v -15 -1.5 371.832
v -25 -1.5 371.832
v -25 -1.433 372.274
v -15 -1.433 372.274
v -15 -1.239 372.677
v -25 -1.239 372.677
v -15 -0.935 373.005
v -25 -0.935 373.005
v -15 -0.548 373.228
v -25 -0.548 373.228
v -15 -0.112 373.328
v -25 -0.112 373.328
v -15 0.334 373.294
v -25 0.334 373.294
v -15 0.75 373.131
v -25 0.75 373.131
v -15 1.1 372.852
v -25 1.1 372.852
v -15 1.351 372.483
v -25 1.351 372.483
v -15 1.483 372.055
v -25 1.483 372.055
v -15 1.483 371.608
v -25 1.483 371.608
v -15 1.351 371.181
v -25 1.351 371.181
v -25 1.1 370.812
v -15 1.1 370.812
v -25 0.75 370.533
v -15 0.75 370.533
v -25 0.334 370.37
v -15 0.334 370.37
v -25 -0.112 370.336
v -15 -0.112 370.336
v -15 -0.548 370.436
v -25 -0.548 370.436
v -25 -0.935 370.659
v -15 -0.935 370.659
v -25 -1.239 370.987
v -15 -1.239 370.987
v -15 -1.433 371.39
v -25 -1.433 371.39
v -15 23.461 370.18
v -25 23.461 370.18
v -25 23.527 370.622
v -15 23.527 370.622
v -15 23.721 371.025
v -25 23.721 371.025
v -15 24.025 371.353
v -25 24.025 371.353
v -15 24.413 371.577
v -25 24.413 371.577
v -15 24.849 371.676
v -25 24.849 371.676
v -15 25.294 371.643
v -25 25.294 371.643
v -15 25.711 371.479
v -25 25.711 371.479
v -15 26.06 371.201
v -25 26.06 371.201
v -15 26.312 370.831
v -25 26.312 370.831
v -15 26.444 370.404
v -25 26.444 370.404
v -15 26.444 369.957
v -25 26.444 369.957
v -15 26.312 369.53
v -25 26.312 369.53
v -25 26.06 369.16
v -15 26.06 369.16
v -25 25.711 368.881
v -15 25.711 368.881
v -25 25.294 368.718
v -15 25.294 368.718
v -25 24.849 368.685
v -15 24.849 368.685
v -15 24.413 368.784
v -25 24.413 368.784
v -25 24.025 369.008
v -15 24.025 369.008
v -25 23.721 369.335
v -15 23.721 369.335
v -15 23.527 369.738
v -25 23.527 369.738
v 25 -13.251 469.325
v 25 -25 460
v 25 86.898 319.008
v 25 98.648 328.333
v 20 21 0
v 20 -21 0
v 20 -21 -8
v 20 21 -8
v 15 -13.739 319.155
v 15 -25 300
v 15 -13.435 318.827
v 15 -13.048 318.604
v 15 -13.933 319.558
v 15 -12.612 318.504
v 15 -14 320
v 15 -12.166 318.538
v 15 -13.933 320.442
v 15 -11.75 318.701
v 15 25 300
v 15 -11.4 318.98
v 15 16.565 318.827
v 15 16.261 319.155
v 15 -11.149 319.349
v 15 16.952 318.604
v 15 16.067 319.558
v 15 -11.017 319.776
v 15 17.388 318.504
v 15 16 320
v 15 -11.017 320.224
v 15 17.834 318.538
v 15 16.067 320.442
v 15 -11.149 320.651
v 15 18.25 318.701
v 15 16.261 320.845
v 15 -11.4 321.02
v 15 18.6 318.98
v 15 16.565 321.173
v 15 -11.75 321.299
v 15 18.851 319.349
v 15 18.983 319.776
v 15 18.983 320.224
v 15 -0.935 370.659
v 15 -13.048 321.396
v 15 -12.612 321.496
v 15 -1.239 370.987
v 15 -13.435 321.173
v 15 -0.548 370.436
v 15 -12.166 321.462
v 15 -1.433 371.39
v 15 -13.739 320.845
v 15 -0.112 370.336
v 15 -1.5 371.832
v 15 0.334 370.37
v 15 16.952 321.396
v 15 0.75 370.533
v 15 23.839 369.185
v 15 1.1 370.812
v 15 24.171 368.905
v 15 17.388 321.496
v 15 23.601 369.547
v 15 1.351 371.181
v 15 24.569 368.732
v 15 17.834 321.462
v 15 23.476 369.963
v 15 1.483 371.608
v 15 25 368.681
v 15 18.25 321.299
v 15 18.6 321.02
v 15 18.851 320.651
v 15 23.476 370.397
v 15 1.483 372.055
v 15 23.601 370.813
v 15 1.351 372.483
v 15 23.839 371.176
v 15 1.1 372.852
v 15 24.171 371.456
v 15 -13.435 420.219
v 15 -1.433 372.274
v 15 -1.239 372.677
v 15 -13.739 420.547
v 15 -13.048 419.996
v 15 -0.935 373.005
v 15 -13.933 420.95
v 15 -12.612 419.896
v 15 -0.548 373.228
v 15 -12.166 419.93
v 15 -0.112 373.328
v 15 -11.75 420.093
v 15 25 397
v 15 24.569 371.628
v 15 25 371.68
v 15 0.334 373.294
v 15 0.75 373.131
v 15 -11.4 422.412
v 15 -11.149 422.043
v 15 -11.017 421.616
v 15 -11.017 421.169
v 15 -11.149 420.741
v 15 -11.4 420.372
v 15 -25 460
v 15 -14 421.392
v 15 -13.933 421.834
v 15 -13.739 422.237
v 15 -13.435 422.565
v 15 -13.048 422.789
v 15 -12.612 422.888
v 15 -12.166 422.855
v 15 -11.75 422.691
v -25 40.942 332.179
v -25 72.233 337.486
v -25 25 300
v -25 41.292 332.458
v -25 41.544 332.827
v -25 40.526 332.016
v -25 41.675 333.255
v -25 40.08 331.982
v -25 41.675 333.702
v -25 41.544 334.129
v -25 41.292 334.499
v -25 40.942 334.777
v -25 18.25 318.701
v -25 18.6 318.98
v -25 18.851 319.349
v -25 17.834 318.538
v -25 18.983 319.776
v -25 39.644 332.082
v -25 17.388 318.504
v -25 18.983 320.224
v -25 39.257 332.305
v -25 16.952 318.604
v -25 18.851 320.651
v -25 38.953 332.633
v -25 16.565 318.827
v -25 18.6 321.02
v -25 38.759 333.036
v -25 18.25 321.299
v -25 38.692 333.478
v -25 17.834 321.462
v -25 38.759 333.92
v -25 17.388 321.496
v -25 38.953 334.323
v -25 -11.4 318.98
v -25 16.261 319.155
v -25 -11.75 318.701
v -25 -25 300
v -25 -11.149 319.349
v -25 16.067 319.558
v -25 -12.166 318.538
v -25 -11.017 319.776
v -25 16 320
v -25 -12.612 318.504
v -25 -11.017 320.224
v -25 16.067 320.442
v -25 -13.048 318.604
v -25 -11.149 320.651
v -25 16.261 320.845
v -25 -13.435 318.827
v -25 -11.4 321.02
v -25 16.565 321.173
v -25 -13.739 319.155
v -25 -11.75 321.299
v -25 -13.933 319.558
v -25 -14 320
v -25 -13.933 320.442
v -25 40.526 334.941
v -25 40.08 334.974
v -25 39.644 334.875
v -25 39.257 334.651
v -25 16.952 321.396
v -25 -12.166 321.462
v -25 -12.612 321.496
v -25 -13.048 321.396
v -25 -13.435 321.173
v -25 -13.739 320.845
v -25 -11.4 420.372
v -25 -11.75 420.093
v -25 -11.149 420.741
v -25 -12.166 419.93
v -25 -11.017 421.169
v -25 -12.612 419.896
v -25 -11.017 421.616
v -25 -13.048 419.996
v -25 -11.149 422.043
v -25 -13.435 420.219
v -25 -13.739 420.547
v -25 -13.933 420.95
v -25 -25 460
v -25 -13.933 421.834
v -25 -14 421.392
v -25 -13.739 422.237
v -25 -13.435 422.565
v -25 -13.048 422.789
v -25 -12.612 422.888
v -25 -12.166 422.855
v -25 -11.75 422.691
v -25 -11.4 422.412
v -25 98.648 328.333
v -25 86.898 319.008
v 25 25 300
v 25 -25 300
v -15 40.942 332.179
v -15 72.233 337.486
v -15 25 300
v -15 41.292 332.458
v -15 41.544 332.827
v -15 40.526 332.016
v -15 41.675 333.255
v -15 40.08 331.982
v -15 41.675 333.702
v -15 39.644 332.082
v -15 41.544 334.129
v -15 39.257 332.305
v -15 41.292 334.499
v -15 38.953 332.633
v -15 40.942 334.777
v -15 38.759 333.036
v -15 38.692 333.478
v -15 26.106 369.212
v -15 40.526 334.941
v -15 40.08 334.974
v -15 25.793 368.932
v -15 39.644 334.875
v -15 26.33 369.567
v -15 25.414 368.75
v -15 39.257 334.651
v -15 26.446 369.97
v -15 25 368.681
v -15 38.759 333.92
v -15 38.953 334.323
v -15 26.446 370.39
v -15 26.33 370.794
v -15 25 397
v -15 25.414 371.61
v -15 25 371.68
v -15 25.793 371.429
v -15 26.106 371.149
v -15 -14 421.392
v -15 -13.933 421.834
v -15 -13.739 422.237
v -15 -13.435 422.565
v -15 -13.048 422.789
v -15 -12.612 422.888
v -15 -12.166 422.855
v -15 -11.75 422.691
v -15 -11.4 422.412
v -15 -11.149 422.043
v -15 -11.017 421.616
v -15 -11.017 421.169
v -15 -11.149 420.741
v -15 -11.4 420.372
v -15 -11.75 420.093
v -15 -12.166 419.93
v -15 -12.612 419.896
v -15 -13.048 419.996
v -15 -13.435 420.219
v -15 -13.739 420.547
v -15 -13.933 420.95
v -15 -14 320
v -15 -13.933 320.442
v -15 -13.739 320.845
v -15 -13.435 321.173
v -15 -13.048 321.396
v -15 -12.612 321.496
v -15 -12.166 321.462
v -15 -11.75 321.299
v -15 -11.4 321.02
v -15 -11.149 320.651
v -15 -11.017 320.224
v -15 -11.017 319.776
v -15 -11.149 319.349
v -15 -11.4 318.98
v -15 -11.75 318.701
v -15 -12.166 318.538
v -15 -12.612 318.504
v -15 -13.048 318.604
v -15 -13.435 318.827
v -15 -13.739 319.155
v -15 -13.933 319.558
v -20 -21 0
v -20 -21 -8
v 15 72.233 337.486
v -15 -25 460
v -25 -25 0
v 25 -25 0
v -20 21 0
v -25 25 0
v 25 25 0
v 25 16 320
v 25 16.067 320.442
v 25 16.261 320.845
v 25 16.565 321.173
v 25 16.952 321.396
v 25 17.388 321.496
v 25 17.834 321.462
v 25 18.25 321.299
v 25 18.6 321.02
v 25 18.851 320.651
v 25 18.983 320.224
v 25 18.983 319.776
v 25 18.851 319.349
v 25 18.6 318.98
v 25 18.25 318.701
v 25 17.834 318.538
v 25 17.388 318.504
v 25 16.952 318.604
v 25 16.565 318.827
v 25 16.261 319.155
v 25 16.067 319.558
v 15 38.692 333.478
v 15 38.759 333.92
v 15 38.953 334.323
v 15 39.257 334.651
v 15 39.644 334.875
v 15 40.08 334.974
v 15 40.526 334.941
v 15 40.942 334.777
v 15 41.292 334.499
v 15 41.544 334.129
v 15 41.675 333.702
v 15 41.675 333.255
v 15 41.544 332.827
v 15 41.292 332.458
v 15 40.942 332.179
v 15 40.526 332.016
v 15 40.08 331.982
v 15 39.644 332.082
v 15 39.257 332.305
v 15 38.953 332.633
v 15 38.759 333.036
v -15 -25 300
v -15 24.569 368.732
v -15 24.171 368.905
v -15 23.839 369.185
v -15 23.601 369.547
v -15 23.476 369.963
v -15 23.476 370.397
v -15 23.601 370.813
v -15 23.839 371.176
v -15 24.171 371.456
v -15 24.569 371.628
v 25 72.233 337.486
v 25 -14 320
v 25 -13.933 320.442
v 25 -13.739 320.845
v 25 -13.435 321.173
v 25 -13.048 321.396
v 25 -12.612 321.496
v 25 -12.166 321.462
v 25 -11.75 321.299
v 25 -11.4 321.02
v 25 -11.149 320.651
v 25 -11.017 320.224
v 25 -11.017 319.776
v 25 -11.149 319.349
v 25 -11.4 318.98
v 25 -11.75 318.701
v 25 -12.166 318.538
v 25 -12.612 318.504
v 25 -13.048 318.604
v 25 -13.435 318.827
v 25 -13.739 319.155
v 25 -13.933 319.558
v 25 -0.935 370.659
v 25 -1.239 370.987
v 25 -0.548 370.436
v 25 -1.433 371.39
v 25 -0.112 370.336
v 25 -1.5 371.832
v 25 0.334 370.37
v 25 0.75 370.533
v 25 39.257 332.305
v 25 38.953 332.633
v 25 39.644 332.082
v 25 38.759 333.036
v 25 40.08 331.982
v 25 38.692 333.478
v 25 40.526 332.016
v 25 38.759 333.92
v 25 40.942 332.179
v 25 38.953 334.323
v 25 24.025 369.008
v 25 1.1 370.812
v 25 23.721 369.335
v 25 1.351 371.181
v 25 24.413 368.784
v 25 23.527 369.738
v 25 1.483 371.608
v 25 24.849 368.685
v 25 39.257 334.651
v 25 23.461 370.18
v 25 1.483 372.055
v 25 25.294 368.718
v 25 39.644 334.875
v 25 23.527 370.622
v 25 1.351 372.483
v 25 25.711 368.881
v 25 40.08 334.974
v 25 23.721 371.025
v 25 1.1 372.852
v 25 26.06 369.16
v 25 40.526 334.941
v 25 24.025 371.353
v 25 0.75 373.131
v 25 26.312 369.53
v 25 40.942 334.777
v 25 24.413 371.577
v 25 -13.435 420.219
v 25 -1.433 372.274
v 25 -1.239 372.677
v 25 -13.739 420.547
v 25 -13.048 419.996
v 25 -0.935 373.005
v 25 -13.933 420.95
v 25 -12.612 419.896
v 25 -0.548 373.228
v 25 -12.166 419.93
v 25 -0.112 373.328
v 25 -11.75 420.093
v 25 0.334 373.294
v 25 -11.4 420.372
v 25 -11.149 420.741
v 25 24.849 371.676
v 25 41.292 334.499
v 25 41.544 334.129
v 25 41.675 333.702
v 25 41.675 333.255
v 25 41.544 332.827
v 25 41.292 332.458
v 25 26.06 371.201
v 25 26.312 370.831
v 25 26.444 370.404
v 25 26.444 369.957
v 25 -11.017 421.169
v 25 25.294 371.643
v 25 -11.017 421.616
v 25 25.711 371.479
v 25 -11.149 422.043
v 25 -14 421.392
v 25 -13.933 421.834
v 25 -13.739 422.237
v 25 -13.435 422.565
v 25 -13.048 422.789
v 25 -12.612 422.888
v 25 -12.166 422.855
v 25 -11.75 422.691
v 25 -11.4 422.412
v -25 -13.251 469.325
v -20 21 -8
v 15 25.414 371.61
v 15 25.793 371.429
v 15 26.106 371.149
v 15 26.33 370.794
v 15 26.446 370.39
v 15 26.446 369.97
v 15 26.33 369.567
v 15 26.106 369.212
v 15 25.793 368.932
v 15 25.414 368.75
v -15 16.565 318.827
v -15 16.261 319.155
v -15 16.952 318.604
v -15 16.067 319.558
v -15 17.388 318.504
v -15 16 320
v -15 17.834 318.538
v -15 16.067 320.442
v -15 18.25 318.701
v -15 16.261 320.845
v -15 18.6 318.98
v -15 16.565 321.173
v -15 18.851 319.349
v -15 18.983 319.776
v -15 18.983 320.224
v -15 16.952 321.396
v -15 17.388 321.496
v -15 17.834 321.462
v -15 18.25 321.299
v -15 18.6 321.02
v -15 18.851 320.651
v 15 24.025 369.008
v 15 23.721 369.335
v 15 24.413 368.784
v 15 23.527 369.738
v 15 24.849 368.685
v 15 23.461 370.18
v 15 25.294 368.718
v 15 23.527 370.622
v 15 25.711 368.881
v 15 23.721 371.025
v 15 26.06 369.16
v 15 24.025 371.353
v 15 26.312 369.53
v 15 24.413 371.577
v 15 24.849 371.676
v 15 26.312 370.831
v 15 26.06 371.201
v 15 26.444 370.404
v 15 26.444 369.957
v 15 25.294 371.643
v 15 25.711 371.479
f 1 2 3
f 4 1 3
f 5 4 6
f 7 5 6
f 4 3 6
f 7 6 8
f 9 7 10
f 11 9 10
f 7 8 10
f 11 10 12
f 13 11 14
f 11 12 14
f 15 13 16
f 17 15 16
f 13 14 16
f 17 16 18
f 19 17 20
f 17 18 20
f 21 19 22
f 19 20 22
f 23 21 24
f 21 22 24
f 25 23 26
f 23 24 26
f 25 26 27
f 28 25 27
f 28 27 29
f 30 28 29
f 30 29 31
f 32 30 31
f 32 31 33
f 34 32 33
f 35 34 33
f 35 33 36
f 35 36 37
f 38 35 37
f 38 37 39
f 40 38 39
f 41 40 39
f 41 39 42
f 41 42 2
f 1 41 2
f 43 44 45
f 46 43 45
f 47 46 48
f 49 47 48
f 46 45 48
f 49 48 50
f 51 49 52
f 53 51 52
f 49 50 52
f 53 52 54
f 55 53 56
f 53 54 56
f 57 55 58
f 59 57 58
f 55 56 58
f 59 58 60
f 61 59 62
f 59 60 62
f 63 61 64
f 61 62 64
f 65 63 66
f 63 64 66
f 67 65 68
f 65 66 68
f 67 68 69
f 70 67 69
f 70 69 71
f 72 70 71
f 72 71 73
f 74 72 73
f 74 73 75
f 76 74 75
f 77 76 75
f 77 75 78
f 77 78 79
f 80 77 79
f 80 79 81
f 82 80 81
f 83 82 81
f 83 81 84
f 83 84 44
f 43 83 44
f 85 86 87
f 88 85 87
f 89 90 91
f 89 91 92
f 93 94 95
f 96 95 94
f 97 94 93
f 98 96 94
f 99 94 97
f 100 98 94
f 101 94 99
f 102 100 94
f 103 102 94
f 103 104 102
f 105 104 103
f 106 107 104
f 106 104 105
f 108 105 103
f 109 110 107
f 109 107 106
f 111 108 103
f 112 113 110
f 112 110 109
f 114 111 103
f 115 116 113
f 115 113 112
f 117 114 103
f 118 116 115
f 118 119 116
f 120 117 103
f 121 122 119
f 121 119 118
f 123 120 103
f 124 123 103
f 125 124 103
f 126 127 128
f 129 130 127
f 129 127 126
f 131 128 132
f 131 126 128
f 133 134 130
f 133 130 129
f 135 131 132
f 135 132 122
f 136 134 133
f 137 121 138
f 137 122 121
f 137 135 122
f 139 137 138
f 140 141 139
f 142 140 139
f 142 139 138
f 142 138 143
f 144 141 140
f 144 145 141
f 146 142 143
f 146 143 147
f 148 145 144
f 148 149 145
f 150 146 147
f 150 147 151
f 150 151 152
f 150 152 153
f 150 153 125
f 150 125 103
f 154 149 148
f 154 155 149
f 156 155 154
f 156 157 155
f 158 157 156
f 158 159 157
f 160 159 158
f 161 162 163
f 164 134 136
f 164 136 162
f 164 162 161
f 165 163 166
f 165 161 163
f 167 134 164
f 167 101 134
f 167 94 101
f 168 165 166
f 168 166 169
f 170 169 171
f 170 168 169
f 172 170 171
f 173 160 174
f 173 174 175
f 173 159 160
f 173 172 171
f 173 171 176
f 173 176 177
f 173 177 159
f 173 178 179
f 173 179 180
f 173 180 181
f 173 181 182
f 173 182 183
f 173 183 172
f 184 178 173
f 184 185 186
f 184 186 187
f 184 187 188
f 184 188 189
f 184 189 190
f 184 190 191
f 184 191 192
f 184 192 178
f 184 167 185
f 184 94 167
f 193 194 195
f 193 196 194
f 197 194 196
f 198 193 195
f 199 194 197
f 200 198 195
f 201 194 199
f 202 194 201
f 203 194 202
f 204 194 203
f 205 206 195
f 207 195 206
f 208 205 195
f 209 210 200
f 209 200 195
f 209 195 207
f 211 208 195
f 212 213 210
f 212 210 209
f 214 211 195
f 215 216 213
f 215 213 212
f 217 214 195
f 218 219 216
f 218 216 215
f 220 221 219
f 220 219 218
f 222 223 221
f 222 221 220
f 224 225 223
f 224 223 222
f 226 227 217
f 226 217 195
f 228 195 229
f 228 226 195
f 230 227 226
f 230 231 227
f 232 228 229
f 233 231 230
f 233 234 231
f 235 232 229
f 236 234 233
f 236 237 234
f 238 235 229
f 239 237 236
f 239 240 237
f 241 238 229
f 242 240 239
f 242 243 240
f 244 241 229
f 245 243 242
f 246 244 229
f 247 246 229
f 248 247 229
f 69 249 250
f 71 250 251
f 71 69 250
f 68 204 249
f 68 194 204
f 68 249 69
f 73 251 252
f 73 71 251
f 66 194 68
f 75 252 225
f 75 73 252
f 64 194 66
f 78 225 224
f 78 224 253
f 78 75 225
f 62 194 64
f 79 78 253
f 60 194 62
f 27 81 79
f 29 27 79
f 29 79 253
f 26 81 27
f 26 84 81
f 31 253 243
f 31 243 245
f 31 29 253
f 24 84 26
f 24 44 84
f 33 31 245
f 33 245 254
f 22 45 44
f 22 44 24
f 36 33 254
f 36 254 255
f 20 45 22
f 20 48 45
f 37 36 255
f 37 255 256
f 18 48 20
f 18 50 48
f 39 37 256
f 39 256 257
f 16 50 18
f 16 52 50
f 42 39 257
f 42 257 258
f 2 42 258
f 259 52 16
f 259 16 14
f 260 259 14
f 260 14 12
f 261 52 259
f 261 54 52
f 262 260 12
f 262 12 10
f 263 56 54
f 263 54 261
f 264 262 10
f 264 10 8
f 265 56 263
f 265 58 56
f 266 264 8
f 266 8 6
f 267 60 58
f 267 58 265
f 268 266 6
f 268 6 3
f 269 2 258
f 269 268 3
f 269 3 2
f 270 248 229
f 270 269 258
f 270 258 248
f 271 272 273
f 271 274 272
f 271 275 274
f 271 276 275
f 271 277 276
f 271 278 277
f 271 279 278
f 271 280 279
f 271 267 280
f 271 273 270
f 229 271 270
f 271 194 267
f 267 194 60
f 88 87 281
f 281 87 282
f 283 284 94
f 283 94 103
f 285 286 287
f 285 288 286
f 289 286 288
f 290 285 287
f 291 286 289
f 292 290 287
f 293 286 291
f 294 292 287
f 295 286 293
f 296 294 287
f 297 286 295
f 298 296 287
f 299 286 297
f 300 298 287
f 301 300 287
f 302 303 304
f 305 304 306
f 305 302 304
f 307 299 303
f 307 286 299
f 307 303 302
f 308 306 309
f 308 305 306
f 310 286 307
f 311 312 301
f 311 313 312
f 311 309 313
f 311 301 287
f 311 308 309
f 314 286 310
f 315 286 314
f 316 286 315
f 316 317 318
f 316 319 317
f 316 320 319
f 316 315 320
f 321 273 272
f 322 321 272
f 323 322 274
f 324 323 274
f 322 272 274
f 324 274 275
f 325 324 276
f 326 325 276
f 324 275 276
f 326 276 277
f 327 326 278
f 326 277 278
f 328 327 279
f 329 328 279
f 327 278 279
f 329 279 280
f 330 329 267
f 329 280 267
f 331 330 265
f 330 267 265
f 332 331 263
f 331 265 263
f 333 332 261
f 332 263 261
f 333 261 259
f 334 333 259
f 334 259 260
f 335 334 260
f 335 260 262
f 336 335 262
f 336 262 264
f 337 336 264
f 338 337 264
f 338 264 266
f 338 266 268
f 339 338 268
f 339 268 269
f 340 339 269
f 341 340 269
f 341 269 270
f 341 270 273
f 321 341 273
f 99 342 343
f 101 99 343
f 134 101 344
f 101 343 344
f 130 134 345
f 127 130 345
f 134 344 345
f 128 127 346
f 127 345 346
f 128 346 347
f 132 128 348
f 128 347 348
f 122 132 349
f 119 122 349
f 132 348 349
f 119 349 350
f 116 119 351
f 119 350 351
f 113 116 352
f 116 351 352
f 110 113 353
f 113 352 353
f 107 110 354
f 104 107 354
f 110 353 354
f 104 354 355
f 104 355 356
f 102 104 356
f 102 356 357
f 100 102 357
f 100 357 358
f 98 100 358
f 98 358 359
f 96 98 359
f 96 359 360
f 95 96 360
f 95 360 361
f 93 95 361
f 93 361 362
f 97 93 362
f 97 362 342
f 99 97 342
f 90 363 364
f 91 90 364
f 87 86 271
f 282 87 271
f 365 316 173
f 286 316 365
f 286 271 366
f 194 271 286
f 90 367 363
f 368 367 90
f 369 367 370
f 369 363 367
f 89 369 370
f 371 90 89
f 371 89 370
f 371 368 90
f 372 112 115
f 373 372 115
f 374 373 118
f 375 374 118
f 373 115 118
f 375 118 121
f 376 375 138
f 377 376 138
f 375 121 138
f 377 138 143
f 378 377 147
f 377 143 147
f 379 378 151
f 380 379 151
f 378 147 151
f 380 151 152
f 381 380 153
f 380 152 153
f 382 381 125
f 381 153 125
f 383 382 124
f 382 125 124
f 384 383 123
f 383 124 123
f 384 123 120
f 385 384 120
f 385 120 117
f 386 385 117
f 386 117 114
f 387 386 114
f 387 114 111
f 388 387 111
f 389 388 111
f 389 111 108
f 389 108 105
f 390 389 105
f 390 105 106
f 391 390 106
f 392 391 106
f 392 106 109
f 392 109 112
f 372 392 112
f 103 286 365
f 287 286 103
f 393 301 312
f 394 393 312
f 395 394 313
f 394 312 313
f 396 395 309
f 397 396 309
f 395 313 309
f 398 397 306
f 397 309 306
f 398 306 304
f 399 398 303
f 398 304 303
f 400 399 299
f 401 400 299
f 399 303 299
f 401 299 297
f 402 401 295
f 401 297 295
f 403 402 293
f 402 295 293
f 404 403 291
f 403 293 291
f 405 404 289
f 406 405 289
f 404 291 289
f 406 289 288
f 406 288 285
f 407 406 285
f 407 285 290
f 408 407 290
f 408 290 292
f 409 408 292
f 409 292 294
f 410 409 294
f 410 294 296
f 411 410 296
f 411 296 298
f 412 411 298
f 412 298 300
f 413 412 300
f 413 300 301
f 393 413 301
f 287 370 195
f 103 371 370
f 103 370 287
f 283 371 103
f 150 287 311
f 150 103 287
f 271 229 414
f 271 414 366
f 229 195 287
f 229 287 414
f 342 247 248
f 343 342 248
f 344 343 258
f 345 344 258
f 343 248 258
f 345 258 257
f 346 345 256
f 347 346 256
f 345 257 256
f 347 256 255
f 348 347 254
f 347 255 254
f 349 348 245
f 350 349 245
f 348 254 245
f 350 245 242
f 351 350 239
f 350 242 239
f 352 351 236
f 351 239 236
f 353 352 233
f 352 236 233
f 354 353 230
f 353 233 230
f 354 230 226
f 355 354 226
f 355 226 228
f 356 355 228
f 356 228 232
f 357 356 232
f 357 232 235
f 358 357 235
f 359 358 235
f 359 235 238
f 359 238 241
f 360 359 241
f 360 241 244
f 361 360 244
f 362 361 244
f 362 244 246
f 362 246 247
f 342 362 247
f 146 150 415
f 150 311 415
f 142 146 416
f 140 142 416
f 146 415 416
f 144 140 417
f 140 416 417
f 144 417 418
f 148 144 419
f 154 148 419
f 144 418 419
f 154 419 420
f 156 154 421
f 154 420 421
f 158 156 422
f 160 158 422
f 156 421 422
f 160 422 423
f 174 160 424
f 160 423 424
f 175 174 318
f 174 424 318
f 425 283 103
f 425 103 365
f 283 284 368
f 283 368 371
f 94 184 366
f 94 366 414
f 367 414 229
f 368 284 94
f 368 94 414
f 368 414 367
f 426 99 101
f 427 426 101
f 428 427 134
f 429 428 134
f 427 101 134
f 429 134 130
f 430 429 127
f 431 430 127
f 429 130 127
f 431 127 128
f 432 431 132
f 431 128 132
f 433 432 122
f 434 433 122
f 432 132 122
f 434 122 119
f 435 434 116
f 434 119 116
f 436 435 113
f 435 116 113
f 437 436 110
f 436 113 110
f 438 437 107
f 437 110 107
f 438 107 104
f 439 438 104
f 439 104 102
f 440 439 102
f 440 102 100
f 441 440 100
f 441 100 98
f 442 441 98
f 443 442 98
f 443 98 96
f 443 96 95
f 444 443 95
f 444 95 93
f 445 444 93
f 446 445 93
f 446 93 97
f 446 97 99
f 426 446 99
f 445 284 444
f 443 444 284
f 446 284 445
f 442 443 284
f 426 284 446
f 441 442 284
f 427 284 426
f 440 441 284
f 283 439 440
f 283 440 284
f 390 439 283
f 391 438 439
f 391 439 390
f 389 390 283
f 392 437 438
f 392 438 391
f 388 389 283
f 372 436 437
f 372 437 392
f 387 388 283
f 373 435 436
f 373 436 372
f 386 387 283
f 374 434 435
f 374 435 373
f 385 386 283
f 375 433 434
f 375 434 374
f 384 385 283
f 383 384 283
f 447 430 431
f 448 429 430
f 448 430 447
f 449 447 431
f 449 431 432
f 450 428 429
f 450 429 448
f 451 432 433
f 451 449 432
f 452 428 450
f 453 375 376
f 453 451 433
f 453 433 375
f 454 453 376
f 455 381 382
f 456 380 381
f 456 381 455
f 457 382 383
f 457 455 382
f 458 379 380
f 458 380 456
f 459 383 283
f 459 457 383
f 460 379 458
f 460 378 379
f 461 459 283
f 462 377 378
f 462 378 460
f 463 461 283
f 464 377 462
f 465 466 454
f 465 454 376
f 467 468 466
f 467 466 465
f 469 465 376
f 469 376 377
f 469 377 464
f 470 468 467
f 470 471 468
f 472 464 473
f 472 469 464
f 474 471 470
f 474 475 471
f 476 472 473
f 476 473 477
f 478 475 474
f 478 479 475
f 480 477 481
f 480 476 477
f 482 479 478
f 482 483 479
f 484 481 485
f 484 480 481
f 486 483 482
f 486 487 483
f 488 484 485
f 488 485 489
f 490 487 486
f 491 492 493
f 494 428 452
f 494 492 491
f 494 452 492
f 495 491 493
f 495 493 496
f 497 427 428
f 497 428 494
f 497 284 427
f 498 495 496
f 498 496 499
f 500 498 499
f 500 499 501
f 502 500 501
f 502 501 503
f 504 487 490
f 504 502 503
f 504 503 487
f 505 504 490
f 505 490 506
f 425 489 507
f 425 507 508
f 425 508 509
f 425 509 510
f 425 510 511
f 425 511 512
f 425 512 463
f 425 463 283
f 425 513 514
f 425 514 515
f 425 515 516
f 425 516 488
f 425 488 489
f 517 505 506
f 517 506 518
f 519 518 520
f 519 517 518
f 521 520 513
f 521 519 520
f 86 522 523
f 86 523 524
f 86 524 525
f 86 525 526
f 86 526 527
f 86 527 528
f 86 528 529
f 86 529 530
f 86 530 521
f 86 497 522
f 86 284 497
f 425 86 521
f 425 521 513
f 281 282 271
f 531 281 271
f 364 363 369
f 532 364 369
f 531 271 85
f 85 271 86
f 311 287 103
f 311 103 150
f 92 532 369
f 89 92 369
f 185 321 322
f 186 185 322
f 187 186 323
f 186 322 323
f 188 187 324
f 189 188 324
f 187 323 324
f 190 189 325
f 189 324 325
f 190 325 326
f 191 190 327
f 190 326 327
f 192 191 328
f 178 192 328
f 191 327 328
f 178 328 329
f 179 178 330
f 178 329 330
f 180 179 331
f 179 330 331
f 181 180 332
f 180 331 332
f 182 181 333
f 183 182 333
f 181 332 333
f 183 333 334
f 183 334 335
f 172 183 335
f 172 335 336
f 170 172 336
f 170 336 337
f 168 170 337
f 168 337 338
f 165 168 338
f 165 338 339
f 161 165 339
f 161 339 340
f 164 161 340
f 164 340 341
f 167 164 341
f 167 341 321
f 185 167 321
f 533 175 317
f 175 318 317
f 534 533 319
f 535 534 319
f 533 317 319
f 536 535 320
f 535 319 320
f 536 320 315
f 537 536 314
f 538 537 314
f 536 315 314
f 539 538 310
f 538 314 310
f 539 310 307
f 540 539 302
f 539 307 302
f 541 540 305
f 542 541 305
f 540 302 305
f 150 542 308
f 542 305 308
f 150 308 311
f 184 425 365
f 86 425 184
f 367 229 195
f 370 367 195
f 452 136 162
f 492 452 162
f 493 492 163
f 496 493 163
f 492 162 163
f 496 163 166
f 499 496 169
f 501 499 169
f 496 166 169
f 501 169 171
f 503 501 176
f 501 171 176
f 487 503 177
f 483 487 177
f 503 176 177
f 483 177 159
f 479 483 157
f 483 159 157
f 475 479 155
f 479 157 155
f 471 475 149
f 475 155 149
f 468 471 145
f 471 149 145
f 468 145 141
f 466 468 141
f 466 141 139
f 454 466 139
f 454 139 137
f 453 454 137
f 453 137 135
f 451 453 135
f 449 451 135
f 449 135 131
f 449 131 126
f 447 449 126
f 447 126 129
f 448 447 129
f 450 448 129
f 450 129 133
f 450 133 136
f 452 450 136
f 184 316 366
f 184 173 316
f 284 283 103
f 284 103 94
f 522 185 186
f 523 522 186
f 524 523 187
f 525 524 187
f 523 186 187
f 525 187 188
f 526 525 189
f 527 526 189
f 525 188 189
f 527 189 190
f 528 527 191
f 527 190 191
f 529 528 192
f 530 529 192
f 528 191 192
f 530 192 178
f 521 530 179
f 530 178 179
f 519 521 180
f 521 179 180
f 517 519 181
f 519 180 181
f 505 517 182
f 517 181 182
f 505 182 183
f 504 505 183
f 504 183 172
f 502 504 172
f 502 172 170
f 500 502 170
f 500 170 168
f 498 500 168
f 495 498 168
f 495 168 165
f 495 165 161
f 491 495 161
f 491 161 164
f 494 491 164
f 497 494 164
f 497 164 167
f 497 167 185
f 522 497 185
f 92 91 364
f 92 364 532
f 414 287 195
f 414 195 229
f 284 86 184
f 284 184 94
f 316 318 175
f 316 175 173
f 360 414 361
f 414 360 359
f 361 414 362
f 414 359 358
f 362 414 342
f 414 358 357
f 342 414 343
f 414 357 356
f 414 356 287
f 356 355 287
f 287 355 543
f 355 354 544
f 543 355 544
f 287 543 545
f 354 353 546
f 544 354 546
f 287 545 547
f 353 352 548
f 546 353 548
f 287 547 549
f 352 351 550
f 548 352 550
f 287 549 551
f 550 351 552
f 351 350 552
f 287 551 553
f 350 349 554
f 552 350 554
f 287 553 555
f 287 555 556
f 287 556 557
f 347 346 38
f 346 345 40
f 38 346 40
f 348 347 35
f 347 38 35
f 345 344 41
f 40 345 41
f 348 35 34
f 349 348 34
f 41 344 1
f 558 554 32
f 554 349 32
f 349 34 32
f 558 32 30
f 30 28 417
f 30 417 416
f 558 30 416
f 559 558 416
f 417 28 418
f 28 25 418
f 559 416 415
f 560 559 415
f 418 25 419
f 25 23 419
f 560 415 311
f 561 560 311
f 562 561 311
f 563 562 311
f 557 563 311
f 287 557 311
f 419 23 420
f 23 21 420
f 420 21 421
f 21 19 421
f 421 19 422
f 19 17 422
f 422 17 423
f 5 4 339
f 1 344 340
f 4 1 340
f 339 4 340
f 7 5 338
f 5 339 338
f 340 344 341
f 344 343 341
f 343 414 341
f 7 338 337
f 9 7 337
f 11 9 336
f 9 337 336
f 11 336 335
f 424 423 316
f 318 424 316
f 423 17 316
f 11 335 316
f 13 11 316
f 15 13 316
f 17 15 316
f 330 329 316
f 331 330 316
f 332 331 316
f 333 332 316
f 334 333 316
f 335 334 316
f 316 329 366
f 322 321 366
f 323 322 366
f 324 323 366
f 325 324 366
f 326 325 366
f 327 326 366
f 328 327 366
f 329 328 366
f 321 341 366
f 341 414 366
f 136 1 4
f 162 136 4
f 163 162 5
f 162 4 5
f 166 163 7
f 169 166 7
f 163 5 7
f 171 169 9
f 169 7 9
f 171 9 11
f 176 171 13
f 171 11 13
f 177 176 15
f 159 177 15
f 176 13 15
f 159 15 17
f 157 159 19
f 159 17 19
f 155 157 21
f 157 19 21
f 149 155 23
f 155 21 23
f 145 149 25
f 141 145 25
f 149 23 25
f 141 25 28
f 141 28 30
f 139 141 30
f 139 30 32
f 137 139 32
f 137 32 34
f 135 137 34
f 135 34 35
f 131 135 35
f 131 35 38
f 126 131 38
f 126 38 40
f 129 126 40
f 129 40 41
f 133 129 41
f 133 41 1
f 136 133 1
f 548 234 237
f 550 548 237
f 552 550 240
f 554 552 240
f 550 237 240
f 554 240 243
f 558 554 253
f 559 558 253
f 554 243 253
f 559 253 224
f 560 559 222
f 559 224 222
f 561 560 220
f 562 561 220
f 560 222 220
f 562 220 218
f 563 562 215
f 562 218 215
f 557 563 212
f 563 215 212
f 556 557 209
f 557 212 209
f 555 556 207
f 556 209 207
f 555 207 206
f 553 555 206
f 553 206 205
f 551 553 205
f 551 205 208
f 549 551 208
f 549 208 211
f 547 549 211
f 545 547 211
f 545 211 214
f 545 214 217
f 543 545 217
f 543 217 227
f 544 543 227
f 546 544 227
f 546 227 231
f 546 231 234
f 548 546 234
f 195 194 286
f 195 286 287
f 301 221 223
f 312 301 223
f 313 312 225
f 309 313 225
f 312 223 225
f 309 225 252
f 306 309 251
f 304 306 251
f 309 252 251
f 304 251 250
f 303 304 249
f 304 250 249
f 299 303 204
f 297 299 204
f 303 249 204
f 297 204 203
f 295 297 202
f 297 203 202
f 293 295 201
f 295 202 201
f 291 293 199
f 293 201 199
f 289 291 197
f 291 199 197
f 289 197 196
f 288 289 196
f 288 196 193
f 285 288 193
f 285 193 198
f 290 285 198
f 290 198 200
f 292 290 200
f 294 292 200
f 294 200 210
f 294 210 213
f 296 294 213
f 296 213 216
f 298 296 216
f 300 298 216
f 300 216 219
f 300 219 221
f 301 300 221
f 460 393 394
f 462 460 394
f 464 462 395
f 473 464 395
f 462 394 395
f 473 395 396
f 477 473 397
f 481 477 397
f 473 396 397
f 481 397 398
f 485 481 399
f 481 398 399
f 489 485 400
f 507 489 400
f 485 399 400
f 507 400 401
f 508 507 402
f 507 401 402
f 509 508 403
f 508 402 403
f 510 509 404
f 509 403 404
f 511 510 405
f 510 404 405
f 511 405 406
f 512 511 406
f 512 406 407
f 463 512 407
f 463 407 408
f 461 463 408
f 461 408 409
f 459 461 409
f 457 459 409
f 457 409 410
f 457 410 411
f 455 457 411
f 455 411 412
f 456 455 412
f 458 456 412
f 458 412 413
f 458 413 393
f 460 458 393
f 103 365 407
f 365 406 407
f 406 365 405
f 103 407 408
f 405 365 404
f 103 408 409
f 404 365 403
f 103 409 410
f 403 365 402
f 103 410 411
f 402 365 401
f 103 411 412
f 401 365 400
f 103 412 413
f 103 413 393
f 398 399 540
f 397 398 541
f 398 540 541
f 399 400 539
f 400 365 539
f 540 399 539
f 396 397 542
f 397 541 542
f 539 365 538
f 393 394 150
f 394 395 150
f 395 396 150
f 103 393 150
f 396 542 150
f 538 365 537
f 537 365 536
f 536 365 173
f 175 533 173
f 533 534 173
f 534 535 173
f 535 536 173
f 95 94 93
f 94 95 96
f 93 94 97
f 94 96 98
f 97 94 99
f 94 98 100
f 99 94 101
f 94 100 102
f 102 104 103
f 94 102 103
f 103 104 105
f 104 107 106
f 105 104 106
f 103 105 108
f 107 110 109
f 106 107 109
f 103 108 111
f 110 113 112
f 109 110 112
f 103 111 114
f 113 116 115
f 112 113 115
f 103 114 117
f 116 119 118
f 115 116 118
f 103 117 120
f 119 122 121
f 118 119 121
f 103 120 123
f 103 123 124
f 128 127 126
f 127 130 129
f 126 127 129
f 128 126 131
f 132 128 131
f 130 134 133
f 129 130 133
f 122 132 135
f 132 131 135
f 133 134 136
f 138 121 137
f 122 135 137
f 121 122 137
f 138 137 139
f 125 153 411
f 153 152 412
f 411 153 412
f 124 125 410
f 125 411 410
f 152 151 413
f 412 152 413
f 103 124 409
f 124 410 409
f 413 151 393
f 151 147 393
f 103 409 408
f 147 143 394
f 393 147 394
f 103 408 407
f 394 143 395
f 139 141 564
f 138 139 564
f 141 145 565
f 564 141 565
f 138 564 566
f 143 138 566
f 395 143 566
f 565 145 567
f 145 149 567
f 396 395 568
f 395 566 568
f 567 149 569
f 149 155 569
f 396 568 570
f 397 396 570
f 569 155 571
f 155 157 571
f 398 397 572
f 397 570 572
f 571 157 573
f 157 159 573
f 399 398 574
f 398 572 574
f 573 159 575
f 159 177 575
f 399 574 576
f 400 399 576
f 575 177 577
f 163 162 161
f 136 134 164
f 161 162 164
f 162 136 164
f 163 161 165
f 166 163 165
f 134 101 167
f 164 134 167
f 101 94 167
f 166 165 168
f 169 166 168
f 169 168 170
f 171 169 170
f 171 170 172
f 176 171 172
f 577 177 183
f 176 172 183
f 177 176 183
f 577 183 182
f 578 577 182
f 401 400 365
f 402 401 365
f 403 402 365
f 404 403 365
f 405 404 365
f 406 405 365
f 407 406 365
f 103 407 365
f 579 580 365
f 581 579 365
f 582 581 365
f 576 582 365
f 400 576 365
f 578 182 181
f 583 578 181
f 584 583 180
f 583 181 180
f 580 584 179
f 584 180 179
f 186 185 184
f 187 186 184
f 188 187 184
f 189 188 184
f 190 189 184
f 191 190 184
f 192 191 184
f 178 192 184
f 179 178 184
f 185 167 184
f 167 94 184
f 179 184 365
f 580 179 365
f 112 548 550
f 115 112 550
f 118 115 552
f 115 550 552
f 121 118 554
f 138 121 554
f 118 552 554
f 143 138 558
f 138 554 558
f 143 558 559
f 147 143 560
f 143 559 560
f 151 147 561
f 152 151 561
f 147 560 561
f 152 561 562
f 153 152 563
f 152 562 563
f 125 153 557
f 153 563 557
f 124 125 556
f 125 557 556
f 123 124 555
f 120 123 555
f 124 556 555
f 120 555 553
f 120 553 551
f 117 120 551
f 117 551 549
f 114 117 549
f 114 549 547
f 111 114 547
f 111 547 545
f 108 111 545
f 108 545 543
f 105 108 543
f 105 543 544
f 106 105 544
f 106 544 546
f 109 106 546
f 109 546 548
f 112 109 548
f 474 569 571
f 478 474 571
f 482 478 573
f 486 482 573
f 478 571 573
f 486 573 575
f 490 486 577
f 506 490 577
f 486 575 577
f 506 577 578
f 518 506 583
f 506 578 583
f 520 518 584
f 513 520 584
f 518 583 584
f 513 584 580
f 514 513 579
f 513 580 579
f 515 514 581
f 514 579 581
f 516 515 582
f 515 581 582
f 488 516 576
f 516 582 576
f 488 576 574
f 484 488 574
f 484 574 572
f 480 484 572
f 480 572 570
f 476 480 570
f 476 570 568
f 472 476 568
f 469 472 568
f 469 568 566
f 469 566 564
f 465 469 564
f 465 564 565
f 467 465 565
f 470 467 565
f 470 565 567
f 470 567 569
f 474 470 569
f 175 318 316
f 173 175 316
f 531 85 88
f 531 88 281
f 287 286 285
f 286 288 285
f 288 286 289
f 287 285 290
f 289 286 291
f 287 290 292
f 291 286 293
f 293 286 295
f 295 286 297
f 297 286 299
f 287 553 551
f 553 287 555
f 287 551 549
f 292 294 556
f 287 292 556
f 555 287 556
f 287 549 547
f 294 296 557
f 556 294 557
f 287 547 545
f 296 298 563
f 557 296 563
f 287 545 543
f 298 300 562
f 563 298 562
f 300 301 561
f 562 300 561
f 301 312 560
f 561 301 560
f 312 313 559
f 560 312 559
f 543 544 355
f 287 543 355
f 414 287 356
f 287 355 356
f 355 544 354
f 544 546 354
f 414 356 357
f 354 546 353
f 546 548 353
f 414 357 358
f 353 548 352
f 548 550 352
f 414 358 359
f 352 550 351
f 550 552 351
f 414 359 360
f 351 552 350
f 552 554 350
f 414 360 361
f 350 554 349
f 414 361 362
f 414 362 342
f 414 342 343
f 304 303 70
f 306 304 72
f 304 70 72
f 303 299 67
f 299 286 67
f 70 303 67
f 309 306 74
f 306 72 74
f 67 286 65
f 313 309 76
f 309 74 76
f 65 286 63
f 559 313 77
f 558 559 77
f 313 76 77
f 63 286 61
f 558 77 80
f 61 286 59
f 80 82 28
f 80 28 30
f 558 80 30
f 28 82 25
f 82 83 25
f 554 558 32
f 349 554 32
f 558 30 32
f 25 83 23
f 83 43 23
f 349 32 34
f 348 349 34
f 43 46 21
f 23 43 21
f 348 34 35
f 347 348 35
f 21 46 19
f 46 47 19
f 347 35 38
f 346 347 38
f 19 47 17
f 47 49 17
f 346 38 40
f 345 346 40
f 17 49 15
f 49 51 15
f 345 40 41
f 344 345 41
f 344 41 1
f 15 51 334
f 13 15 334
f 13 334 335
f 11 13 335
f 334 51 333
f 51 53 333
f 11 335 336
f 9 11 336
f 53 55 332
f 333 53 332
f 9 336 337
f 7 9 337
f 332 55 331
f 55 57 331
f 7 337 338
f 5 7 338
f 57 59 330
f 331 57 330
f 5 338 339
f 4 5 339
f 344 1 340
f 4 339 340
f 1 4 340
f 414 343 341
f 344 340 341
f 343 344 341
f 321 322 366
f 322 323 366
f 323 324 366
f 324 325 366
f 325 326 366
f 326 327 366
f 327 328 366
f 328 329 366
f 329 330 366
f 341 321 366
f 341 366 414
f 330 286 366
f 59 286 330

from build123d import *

# Parameters (mm, degrees)
F1_DEPTH  = 20
F2_DEPTH  = 25
F3_DEPTH  = 15
F5_DEPTH  = 30
F7_DEPTH  = 10
F9_DEPTH  = 10
F10_R     = 1.5
F11_DEPTH = 50.001
F12_W     = 30
F12_H     = 80.4300938704
F12_H_2   = 75.9790235959
F13_DEPTH = 15


with BuildPart() as f1:
    # F0 (on Right) → F1 (new body, symmetric)
    with BuildSketch(Plane.YZ):
        Polygon((21, 0), (0, 0), (-21, 0), (-21, -8), (0, -8), (21, -8), align=None)
    extrude(amount=F1_DEPTH, both=True)

    # F0 (on Right) → F2 (join, symmetric)
    with BuildSketch(Plane.YZ):
        Polygon((-21, 0), (0, 0), (21, 0), (25, 0), (25, 300), (-25, 300), (-25, 0), align=None)
    extrude(amount=F2_DEPTH, both=True)

    # F0 (on Right) → F3 (join, symmetric)
    with BuildSketch(Plane.YZ):
        Polygon((-25, 460), (-25, 300), (25, 300), (25, 397), align=None)
    extrude(amount=F3_DEPTH, both=True)


with BuildPart() as f5:
    # F4 (on face) → F5 (new body)
    with BuildSketch(Plane(origin=(-15, 0, 0), x_dir=(0, -1, 0), z_dir=(-1, 0, 0))):
        Polygon((-25, 300), (-25, 397), (-72.2329571804, 337.4864739527), align=None)
    extrude(amount=-F5_DEPTH)


with BuildPart() as f7:
    # F6 (on face) → F7 (new body)
    with BuildSketch(Plane(origin=(-25, 0, 0), x_dir=(0, -1, 0), z_dir=(-1, 0, 0))):
        Polygon((-25, 300), (25, 300), (25, 460), (-25, 397), (-72.2329571804, 337.4864739527), align=None)
    extrude(amount=-F7_DEPTH)


with BuildPart() as f9:
    # F8 (on face) → F9 (new body)
    with BuildSketch(Plane.YZ.offset(25)):
        Polygon((25, 397), (-25, 460), (-25, 300), (25, 300), (72.2329571804, 337.4864739527), align=None)
    extrude(amount=-F9_DEPTH)


with BuildPart() as f11_tool:
    # F10 (on face) → F11 (new body, through all)
    with BuildSketch(Plane(origin=(-25, 0, 0), x_dir=(0, -1, 0), z_dir=(-1, 0, 0))):
        with Locations((-40.192078799, 333.4782421589)):
            Circle(F10_R)
        with Locations((-17.5, 320)):
            Circle(F10_R)
        with Locations((12.5, 320)):
            Circle(F10_R)
        with Locations((0, 371.8319237232)):
            Circle(F10_R)
        with Locations((-24.9607171863, 370.1803386211)):
            Circle(F10_R)
        with Locations((12.5, 421.3922023773)):
            Circle(F10_R)
    extrude(amount=-F11_DEPTH)


with BuildPart() as f1_1:
    add(f1.part)

    # F11: cut by f11_tool
    add(f11_tool.part, mode=Mode.SUBTRACT)


with BuildPart() as f5_1:
    add(f5.part)

    # F11: cut by f11_tool
    add(f11_tool.part, mode=Mode.SUBTRACT)


with BuildPart() as f7_1:
    add(f7.part)

    # F11: cut by f11_tool
    add(f11_tool.part, mode=Mode.SUBTRACT)


with BuildPart() as f9_1:
    add(f9.part)

    # F11: cut by f11_tool
    add(f11_tool.part, mode=Mode.SUBTRACT)


with BuildPart() as f13:
    # F12 (on face) → F13 (new body)
    with BuildSketch(Plane(origin=(0, 208.6528056887, 165.5974648323), x_dir=(-1, 0, 0), z_dir=(0, 0.7832889031, 0.6216578596))):
        Polygon((-15, 375.8543418924), (-25, 375.8543418924), (-25, 219.4452244261), (-15, 219.4452244261), (-15, 295.424248022), align=None)
        Polygon((-15, 219.4452244261), (-25, 219.4452244261), (-25, 195.8543418924), (25, 195.8543418924), (25, 219.4452244261), (15, 219.4452244261), align=None)
        with Locations((0, 335.6392949572)):
            Rectangle(F12_W, F12_H)
        Polygon((25, 375.8543418924), (15, 375.8543418924), (15, 295.424248022), (15, 219.4452244261), (25, 219.4452244261), align=None)
        with Locations((0, 257.4347362241)):
            Rectangle(F12_W, F12_H_2)
    extrude(amount=F13_DEPTH)


solid = Compound([f1_1.part, f5_1.part, f7_1.part, f9_1.part, f13.part])
